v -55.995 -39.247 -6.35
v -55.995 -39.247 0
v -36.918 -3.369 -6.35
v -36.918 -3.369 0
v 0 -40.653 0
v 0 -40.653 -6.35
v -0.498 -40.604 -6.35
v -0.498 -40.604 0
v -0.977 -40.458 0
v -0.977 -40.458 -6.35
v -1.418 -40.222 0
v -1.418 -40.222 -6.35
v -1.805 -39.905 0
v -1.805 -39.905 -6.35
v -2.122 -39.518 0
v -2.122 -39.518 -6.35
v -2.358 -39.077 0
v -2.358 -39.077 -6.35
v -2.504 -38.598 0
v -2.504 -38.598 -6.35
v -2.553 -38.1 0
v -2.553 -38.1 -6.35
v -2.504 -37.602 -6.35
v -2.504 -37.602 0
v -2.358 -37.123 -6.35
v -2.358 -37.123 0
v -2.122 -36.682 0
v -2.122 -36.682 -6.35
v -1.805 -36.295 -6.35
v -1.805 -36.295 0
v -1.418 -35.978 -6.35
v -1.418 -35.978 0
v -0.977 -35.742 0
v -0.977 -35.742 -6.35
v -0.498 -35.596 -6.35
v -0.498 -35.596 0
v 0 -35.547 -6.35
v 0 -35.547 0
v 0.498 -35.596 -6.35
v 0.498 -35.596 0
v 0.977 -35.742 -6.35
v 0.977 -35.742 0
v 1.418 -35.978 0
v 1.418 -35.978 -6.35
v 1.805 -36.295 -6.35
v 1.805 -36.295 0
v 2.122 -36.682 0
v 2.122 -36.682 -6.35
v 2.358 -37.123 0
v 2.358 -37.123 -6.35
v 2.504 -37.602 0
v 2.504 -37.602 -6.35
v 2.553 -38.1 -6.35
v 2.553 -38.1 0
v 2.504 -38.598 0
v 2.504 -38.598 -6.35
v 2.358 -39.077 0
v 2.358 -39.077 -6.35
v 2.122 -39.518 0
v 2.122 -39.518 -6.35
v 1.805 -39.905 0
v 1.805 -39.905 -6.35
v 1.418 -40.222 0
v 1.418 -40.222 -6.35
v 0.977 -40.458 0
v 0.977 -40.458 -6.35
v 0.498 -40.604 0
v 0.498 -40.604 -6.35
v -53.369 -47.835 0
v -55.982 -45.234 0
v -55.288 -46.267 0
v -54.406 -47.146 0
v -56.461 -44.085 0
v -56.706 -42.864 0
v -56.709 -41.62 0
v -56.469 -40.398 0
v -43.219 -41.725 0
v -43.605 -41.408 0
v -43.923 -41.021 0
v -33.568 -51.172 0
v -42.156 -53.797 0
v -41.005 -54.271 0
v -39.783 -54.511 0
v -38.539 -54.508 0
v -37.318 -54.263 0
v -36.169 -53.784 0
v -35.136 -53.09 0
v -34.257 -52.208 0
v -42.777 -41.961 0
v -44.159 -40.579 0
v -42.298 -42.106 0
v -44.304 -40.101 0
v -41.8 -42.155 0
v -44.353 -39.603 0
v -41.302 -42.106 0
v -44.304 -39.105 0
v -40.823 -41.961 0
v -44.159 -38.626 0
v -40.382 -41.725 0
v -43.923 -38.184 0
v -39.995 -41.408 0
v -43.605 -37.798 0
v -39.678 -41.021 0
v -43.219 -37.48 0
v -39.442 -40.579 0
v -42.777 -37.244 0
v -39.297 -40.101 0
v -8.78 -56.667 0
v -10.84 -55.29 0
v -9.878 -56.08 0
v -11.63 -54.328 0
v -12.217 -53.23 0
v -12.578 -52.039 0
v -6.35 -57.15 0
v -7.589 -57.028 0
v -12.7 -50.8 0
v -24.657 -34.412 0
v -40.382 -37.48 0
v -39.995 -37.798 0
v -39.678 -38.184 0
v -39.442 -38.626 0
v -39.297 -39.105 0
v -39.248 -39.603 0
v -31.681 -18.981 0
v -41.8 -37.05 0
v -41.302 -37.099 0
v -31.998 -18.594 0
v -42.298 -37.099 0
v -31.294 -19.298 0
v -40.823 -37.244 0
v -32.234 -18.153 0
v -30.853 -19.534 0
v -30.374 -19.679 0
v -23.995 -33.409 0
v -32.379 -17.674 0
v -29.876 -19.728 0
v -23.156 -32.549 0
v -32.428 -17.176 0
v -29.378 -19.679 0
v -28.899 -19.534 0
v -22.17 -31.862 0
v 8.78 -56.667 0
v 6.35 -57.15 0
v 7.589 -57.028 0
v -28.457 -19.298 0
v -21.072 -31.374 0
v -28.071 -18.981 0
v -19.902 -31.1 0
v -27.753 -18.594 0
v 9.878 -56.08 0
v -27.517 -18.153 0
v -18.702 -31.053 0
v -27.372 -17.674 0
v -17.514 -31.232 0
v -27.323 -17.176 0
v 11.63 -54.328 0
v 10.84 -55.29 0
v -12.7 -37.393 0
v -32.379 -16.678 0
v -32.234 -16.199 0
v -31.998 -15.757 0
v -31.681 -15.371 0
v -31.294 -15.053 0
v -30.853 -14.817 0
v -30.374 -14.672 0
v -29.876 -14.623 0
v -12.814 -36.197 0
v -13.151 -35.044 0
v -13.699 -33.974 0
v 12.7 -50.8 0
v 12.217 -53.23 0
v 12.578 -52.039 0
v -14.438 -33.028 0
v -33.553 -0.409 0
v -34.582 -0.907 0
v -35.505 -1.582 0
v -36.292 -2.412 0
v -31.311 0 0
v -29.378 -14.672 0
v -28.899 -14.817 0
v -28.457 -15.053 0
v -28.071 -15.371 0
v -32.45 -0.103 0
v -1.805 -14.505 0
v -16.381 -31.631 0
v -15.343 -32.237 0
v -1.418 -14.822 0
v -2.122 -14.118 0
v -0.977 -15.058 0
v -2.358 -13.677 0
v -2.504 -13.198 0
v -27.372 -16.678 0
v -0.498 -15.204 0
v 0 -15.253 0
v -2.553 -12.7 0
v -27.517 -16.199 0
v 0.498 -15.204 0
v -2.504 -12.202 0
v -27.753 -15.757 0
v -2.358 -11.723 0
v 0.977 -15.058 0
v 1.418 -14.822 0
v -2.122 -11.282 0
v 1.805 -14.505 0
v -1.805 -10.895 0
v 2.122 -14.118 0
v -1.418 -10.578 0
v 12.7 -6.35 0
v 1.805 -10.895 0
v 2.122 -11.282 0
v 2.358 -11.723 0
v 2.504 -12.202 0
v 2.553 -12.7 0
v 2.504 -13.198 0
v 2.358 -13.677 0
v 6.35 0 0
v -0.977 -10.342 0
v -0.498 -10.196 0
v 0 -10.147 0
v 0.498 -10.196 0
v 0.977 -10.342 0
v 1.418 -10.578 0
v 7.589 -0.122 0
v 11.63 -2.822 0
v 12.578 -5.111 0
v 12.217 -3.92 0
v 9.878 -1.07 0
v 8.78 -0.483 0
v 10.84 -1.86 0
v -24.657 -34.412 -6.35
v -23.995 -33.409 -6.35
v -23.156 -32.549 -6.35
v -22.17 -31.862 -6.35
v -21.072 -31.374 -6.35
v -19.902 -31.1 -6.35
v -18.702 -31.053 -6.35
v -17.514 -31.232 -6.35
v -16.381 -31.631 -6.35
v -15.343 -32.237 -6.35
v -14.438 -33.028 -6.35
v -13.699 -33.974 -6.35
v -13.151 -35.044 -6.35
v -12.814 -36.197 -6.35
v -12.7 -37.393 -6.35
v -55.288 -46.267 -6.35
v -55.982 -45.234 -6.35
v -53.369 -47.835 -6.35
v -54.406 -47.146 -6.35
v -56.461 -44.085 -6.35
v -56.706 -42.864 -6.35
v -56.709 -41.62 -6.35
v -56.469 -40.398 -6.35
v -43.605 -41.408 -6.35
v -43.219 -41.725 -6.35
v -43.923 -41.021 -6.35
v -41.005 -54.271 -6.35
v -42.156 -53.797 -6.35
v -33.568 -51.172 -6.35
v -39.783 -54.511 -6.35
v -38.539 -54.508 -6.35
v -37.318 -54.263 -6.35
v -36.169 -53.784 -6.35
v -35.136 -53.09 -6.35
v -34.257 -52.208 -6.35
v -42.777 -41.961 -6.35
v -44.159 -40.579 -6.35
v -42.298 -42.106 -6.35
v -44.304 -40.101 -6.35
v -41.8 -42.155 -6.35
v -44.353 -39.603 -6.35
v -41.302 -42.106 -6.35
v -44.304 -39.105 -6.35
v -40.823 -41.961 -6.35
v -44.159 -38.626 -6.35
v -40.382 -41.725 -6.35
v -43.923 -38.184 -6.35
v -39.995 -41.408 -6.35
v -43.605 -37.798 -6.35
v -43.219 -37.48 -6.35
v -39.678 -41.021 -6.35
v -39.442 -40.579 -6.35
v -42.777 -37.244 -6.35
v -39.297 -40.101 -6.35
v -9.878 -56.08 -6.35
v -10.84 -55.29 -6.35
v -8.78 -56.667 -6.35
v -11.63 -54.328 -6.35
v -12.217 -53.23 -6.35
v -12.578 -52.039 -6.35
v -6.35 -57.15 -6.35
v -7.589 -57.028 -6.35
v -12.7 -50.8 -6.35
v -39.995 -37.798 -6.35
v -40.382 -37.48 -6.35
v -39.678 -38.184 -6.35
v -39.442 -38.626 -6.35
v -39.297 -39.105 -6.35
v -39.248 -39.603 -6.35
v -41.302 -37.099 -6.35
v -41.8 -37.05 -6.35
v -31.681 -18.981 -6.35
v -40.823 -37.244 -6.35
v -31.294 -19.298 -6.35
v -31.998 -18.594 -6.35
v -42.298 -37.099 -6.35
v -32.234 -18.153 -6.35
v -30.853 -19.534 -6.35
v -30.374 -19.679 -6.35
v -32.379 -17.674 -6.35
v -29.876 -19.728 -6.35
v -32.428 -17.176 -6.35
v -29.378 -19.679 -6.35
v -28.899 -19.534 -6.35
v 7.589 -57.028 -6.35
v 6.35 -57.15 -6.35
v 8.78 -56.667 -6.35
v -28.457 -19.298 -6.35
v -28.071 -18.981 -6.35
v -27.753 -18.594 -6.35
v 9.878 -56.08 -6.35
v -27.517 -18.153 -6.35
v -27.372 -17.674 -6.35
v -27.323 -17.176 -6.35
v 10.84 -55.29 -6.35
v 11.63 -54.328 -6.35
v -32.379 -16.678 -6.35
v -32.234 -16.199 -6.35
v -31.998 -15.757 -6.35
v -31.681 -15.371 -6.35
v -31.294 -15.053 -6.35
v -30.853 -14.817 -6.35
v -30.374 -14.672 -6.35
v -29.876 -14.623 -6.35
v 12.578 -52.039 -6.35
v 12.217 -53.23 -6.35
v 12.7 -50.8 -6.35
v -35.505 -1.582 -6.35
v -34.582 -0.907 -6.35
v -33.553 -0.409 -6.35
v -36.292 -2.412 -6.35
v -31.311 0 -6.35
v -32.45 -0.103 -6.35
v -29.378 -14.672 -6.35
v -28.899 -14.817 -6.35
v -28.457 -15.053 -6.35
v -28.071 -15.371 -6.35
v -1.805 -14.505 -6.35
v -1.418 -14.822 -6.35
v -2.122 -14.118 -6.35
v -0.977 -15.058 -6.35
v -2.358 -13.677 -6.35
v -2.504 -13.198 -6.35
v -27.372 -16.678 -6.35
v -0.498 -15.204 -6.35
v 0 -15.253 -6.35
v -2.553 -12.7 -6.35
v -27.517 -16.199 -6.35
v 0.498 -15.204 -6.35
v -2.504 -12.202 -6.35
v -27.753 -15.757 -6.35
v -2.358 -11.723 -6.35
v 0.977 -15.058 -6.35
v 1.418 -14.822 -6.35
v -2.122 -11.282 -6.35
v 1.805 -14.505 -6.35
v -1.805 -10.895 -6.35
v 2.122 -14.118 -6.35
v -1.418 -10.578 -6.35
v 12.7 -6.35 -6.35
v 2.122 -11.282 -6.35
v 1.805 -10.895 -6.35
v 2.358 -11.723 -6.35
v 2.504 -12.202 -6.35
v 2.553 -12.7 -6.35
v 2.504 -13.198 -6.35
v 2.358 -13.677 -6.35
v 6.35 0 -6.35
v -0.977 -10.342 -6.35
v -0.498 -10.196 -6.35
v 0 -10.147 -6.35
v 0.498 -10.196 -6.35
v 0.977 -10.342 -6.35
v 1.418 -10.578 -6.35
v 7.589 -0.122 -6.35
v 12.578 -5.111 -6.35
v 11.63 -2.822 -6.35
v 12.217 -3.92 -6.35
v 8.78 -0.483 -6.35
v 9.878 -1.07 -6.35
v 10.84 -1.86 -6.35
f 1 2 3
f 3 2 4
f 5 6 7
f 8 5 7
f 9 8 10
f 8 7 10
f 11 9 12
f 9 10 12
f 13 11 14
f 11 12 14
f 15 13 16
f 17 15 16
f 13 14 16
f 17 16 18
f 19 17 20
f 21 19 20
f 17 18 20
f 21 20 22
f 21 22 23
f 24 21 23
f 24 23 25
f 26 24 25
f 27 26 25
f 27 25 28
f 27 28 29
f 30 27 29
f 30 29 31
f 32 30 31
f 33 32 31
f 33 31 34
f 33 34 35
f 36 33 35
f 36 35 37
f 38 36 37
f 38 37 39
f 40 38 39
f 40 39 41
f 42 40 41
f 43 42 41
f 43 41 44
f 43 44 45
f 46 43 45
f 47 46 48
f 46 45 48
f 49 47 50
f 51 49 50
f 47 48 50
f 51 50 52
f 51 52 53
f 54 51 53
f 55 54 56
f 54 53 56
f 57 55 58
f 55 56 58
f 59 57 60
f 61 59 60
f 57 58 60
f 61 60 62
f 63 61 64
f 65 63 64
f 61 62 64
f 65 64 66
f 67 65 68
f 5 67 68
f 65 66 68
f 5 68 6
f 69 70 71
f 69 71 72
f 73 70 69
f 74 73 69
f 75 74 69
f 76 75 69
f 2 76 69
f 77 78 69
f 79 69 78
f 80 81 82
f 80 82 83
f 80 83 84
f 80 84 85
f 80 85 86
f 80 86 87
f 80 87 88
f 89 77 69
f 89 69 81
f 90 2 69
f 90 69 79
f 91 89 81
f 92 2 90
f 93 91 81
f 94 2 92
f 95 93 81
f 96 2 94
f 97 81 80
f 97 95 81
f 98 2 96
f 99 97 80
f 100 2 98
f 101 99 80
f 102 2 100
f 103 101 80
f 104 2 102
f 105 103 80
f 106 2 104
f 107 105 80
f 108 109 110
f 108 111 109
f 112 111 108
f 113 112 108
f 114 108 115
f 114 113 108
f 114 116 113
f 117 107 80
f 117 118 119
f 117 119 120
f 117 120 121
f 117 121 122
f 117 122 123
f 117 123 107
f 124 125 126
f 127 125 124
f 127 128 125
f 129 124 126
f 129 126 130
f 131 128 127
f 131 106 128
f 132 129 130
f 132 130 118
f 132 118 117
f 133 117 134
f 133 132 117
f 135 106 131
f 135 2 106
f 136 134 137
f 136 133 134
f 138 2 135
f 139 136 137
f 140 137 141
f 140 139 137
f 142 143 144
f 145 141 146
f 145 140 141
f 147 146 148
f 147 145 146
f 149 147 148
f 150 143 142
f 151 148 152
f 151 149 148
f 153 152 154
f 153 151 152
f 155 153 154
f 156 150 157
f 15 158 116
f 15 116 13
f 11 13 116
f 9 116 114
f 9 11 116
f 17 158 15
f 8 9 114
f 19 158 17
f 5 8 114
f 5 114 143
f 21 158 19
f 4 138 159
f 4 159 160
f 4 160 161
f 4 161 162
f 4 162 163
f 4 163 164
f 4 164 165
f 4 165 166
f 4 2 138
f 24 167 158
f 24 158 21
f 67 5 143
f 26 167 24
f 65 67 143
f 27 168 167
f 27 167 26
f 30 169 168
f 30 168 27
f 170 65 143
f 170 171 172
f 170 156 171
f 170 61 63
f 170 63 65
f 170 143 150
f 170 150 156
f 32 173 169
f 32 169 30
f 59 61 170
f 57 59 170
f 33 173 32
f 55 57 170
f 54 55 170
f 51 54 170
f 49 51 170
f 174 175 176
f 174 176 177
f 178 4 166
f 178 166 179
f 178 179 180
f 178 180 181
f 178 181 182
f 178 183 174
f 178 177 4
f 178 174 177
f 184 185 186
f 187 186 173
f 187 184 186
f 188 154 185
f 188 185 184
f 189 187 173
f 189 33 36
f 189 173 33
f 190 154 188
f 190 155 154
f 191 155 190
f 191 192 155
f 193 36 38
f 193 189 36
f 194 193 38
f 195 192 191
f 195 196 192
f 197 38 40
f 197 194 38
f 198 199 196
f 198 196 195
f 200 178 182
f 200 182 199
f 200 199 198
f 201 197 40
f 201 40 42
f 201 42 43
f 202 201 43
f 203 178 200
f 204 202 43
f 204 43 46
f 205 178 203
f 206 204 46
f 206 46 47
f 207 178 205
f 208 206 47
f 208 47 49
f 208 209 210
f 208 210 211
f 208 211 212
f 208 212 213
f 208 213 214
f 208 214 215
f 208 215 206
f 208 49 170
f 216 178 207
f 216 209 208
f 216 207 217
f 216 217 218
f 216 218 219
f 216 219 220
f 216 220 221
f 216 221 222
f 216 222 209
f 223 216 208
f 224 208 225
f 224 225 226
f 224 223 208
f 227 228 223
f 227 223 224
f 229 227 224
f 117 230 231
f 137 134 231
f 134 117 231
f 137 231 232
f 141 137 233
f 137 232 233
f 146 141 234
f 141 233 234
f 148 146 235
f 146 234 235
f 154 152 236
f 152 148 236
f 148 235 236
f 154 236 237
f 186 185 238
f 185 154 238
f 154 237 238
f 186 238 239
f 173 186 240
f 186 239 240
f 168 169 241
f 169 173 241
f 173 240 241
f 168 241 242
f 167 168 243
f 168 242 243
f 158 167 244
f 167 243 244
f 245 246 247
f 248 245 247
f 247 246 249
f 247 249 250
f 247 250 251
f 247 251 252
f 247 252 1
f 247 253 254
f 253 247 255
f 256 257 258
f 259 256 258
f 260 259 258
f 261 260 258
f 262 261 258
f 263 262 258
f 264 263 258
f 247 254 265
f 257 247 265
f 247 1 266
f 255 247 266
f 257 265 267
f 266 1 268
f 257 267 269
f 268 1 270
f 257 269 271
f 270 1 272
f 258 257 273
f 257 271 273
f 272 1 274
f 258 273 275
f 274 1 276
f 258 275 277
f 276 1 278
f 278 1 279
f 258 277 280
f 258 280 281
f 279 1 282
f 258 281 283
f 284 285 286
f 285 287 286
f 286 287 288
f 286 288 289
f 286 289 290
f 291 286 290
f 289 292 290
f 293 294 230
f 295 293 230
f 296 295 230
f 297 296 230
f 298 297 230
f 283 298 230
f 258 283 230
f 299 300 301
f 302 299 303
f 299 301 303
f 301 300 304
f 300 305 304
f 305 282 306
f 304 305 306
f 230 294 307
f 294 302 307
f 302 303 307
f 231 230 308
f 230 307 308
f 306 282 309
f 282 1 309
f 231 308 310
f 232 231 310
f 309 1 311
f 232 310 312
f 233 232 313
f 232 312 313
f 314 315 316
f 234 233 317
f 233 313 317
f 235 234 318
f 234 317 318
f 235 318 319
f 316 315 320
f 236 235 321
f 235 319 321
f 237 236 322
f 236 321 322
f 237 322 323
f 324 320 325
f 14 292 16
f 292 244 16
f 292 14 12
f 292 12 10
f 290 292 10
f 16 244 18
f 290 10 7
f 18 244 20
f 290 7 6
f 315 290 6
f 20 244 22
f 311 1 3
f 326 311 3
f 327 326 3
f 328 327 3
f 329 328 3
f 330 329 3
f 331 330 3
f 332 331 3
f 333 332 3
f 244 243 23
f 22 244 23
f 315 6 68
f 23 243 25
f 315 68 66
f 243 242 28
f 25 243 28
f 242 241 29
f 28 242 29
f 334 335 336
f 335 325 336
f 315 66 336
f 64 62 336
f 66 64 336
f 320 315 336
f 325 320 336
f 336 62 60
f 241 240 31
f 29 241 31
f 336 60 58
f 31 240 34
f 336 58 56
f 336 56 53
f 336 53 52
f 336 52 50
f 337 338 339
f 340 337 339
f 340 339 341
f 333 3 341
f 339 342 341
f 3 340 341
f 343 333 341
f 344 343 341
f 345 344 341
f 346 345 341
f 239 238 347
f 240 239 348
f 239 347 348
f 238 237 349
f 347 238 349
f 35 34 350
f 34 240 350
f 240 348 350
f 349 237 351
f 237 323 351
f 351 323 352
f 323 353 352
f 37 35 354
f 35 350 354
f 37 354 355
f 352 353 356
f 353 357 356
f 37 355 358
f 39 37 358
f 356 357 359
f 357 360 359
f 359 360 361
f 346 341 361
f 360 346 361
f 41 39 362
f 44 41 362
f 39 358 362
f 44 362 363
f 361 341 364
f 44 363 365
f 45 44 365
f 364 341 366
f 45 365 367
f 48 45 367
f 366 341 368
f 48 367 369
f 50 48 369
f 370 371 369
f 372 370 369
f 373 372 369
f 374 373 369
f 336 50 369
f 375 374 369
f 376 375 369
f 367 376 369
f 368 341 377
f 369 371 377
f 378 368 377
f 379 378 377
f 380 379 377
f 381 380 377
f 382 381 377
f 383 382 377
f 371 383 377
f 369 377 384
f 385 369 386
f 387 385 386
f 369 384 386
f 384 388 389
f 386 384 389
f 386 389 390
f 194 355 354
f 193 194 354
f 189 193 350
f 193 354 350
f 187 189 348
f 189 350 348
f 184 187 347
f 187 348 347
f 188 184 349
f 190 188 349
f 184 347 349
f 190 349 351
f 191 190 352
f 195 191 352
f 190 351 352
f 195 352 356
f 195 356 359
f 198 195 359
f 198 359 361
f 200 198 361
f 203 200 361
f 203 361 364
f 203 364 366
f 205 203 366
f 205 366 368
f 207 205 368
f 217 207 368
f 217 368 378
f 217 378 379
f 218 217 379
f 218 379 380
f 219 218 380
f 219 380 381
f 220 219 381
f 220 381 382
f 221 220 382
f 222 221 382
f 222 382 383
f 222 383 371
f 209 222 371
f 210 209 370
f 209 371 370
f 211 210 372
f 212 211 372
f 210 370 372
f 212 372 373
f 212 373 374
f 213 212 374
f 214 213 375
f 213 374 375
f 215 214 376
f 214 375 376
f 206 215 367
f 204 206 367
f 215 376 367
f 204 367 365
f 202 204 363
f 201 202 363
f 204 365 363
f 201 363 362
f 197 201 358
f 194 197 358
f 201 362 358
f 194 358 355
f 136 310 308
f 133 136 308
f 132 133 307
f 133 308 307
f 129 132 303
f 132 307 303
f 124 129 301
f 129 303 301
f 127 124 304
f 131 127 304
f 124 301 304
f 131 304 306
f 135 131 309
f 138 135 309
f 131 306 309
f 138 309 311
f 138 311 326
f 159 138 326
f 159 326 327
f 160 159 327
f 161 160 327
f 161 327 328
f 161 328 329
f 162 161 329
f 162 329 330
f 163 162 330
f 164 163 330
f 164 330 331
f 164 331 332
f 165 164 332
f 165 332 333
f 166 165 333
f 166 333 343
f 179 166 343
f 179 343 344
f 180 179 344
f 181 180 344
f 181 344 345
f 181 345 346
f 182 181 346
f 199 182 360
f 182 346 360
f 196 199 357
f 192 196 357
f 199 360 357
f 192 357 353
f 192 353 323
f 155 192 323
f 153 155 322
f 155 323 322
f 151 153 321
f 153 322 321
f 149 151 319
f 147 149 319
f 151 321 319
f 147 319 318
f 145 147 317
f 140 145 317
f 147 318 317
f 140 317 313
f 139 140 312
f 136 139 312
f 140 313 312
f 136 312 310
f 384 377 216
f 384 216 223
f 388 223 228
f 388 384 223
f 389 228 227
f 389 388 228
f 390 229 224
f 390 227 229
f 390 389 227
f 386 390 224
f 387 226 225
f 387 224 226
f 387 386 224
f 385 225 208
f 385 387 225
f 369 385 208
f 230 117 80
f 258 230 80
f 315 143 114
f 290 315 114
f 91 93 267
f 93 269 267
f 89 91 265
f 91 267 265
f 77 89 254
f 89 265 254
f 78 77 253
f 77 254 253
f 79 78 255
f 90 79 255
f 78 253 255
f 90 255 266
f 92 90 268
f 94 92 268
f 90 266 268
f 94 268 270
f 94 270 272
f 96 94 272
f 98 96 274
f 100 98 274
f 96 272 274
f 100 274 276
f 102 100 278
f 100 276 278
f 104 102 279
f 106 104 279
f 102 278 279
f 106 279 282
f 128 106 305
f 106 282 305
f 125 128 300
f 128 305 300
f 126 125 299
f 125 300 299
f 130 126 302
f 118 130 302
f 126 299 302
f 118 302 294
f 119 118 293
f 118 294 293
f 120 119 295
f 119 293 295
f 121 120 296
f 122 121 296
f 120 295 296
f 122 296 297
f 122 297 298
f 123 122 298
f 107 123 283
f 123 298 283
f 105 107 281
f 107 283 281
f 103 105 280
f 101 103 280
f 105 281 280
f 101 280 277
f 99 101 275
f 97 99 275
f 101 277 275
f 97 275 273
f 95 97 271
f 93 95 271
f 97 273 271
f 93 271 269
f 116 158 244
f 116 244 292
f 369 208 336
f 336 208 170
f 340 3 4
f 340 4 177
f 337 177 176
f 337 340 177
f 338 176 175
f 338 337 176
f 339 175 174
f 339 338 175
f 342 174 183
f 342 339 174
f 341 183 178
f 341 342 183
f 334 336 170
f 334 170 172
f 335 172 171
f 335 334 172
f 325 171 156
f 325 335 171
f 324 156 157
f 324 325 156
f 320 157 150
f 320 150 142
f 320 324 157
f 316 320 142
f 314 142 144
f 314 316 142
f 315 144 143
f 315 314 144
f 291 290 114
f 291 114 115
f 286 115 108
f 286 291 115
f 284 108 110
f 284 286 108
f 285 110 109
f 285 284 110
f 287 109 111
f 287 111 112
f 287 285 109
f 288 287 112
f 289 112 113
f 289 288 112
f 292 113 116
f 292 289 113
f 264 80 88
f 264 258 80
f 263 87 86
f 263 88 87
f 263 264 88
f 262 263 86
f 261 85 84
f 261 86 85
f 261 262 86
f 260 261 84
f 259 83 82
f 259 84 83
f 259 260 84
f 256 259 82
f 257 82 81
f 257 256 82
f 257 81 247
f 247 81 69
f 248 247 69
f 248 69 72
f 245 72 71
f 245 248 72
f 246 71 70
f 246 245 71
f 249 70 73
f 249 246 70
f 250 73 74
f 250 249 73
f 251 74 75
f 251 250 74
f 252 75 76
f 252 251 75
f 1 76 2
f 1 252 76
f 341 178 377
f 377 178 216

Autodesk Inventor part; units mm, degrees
ref_plane "YZ Plane" through (0, 0, 0) normal (1, 0, 0) x (0, 1, 0)
ref_plane "XZ Plane" through (0, 0, 0) normal (0, 1, 0) x (-1, 0, 0)
ref_plane "XY Plane" through (0, 0, 0) normal (0, 0, 1) x (1, 0, 0)
sketch "Sketch1" plane through (0, 0, 0) normal (0, 0, 1) x (1, 0, 0)
  line L0 (-12.7, 0) -> (12.7, 0) construction
  line L1 (12.7, 0) -> (12.7, -57.15)
  line L2 (12.7, -57.15) -> (-12.7, -57.15)
  line L3 (-12.7, -57.15) -> (-12.7, 0) construction
  line L4 (-35.1269, 0) -> (-12.7, -11.9246) construction
  line L5 (-12.7, -11.9246) -> (-36.5492, -56.7783)
  line L6 (-36.5492, -56.7783) -> (-58.976, -44.8537)
  line L7 (-58.976, -44.8537) -> (-35.1269, 0)
  line L8 (-23.9134, -5.9623) -> (-47.7626, -50.816) construction
  line L9 (-35.1269, 0) -> (12.7, 0)
  line L10 (-12.7, -11.9246) -> (-12.7, -57.15)
  point P0 (0, 0)
  point P1 (0, 0)
  point P2 (-29.8757, -17.1757)
  point P3 (-41.8003, -39.6026)
  point P4 (0, -12.7)
  point P5 (0, -38.1)
  dimension "d0" = 25.4
  dimension "d1" = 25.4
  dimension "d2" = 28
  dimension "d3" = 50.8
  dimension "d4" = 25.4
  dimension "d5" = 12.7
  dimension "d6" = 25.4
  dimension "d7" = 12.7
  dimension "d8" = 57.15
extrude "Extrusion1" add sketch "Sketch1" against normal blind 6.35
hole "Hole1" at (-29.8757, -17.1757, 0) at (-41.8003, -39.6026, 0) at (0, -12.7, 0) at (0, -38.1, 0) direction (0, 0, -1) diameter 5.1054 end through all clearance for "Flat Head Machine Screw (82)" size "#10" standard "Ansi Unified Screw Threads"
fillet "Fillet1" radius 6.35 7 edges at (12.7, 0, -3.175) (12.7, -57.15, -3.175) (-12.7, -57.15, -3.175) (-12.7, -11.9246, -3.175) (-36.5492, -56.7783, -3.175) (-58.976, -44.8537, -3.175) (-35.1269, 0, -3.175)
properties part number "CL4-009" material "Aluminum 6061"
